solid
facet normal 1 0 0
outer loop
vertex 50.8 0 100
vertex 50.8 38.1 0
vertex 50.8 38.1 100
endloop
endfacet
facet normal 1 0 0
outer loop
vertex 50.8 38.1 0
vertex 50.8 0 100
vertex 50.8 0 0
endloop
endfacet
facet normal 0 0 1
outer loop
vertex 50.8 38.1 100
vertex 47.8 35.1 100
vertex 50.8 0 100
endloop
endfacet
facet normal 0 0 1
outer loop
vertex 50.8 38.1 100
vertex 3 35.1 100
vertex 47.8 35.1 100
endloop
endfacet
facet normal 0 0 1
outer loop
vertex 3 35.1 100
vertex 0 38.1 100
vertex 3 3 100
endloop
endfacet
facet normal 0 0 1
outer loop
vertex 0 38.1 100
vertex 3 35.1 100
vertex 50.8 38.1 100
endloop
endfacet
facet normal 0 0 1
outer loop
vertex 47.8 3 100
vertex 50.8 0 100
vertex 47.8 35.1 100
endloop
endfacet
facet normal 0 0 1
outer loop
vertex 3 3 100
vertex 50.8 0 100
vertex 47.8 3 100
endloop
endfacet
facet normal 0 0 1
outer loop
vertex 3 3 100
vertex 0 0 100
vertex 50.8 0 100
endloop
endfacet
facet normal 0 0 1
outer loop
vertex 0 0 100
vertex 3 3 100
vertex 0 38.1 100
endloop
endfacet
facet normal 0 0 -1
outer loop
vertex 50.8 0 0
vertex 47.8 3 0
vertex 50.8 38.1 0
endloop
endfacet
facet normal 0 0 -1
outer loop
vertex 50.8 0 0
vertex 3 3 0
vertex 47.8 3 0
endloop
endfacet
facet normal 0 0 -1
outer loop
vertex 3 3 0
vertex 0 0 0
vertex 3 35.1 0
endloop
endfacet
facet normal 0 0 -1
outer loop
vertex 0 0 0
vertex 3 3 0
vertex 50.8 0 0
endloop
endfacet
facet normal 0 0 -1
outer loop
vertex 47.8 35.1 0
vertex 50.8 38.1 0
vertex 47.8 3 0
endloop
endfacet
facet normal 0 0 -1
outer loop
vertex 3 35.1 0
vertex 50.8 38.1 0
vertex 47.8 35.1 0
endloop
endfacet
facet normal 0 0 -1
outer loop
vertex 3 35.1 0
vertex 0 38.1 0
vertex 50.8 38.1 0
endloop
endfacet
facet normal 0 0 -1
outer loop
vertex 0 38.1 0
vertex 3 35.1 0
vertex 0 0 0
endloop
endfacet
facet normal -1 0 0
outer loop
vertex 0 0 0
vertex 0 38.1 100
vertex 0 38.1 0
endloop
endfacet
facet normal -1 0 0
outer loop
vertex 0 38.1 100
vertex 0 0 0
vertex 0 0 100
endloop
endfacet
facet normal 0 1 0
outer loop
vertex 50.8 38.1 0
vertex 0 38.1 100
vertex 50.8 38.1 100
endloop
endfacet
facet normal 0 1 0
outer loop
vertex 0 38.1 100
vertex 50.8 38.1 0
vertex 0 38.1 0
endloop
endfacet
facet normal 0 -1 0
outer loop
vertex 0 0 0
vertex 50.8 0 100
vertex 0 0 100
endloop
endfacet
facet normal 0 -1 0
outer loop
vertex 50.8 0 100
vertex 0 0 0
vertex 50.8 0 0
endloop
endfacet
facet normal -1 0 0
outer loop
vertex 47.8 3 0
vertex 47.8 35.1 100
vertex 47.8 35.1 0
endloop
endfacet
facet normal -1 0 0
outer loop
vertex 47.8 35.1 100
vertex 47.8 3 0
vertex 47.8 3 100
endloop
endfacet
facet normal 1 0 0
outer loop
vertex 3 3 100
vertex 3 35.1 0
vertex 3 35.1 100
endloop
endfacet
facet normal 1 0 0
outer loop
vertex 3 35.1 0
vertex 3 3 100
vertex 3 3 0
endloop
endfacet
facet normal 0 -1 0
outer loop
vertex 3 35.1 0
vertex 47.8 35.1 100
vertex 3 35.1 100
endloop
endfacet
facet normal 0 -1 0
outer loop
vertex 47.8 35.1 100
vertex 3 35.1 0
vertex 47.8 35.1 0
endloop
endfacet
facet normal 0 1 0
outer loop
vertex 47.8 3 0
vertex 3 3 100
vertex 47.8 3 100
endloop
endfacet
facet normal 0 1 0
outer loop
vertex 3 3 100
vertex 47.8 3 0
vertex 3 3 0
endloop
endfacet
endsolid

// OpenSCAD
$fn = 64;

outer_w = 50.8;   // mm
outer_h = 38.1;   // mm
wall    = 3.0;    // mm
length  = 100;    // mm (extrusion length)

inner_w = outer_w - 2*wall;
inner_h = outer_h - 2*wall;

difference() {
    cube([outer_w, outer_h, length], center=false);
    translate([wall, wall, -0.1])
        cube([inner_w, inner_h, length + 0.2], center=false);
}
